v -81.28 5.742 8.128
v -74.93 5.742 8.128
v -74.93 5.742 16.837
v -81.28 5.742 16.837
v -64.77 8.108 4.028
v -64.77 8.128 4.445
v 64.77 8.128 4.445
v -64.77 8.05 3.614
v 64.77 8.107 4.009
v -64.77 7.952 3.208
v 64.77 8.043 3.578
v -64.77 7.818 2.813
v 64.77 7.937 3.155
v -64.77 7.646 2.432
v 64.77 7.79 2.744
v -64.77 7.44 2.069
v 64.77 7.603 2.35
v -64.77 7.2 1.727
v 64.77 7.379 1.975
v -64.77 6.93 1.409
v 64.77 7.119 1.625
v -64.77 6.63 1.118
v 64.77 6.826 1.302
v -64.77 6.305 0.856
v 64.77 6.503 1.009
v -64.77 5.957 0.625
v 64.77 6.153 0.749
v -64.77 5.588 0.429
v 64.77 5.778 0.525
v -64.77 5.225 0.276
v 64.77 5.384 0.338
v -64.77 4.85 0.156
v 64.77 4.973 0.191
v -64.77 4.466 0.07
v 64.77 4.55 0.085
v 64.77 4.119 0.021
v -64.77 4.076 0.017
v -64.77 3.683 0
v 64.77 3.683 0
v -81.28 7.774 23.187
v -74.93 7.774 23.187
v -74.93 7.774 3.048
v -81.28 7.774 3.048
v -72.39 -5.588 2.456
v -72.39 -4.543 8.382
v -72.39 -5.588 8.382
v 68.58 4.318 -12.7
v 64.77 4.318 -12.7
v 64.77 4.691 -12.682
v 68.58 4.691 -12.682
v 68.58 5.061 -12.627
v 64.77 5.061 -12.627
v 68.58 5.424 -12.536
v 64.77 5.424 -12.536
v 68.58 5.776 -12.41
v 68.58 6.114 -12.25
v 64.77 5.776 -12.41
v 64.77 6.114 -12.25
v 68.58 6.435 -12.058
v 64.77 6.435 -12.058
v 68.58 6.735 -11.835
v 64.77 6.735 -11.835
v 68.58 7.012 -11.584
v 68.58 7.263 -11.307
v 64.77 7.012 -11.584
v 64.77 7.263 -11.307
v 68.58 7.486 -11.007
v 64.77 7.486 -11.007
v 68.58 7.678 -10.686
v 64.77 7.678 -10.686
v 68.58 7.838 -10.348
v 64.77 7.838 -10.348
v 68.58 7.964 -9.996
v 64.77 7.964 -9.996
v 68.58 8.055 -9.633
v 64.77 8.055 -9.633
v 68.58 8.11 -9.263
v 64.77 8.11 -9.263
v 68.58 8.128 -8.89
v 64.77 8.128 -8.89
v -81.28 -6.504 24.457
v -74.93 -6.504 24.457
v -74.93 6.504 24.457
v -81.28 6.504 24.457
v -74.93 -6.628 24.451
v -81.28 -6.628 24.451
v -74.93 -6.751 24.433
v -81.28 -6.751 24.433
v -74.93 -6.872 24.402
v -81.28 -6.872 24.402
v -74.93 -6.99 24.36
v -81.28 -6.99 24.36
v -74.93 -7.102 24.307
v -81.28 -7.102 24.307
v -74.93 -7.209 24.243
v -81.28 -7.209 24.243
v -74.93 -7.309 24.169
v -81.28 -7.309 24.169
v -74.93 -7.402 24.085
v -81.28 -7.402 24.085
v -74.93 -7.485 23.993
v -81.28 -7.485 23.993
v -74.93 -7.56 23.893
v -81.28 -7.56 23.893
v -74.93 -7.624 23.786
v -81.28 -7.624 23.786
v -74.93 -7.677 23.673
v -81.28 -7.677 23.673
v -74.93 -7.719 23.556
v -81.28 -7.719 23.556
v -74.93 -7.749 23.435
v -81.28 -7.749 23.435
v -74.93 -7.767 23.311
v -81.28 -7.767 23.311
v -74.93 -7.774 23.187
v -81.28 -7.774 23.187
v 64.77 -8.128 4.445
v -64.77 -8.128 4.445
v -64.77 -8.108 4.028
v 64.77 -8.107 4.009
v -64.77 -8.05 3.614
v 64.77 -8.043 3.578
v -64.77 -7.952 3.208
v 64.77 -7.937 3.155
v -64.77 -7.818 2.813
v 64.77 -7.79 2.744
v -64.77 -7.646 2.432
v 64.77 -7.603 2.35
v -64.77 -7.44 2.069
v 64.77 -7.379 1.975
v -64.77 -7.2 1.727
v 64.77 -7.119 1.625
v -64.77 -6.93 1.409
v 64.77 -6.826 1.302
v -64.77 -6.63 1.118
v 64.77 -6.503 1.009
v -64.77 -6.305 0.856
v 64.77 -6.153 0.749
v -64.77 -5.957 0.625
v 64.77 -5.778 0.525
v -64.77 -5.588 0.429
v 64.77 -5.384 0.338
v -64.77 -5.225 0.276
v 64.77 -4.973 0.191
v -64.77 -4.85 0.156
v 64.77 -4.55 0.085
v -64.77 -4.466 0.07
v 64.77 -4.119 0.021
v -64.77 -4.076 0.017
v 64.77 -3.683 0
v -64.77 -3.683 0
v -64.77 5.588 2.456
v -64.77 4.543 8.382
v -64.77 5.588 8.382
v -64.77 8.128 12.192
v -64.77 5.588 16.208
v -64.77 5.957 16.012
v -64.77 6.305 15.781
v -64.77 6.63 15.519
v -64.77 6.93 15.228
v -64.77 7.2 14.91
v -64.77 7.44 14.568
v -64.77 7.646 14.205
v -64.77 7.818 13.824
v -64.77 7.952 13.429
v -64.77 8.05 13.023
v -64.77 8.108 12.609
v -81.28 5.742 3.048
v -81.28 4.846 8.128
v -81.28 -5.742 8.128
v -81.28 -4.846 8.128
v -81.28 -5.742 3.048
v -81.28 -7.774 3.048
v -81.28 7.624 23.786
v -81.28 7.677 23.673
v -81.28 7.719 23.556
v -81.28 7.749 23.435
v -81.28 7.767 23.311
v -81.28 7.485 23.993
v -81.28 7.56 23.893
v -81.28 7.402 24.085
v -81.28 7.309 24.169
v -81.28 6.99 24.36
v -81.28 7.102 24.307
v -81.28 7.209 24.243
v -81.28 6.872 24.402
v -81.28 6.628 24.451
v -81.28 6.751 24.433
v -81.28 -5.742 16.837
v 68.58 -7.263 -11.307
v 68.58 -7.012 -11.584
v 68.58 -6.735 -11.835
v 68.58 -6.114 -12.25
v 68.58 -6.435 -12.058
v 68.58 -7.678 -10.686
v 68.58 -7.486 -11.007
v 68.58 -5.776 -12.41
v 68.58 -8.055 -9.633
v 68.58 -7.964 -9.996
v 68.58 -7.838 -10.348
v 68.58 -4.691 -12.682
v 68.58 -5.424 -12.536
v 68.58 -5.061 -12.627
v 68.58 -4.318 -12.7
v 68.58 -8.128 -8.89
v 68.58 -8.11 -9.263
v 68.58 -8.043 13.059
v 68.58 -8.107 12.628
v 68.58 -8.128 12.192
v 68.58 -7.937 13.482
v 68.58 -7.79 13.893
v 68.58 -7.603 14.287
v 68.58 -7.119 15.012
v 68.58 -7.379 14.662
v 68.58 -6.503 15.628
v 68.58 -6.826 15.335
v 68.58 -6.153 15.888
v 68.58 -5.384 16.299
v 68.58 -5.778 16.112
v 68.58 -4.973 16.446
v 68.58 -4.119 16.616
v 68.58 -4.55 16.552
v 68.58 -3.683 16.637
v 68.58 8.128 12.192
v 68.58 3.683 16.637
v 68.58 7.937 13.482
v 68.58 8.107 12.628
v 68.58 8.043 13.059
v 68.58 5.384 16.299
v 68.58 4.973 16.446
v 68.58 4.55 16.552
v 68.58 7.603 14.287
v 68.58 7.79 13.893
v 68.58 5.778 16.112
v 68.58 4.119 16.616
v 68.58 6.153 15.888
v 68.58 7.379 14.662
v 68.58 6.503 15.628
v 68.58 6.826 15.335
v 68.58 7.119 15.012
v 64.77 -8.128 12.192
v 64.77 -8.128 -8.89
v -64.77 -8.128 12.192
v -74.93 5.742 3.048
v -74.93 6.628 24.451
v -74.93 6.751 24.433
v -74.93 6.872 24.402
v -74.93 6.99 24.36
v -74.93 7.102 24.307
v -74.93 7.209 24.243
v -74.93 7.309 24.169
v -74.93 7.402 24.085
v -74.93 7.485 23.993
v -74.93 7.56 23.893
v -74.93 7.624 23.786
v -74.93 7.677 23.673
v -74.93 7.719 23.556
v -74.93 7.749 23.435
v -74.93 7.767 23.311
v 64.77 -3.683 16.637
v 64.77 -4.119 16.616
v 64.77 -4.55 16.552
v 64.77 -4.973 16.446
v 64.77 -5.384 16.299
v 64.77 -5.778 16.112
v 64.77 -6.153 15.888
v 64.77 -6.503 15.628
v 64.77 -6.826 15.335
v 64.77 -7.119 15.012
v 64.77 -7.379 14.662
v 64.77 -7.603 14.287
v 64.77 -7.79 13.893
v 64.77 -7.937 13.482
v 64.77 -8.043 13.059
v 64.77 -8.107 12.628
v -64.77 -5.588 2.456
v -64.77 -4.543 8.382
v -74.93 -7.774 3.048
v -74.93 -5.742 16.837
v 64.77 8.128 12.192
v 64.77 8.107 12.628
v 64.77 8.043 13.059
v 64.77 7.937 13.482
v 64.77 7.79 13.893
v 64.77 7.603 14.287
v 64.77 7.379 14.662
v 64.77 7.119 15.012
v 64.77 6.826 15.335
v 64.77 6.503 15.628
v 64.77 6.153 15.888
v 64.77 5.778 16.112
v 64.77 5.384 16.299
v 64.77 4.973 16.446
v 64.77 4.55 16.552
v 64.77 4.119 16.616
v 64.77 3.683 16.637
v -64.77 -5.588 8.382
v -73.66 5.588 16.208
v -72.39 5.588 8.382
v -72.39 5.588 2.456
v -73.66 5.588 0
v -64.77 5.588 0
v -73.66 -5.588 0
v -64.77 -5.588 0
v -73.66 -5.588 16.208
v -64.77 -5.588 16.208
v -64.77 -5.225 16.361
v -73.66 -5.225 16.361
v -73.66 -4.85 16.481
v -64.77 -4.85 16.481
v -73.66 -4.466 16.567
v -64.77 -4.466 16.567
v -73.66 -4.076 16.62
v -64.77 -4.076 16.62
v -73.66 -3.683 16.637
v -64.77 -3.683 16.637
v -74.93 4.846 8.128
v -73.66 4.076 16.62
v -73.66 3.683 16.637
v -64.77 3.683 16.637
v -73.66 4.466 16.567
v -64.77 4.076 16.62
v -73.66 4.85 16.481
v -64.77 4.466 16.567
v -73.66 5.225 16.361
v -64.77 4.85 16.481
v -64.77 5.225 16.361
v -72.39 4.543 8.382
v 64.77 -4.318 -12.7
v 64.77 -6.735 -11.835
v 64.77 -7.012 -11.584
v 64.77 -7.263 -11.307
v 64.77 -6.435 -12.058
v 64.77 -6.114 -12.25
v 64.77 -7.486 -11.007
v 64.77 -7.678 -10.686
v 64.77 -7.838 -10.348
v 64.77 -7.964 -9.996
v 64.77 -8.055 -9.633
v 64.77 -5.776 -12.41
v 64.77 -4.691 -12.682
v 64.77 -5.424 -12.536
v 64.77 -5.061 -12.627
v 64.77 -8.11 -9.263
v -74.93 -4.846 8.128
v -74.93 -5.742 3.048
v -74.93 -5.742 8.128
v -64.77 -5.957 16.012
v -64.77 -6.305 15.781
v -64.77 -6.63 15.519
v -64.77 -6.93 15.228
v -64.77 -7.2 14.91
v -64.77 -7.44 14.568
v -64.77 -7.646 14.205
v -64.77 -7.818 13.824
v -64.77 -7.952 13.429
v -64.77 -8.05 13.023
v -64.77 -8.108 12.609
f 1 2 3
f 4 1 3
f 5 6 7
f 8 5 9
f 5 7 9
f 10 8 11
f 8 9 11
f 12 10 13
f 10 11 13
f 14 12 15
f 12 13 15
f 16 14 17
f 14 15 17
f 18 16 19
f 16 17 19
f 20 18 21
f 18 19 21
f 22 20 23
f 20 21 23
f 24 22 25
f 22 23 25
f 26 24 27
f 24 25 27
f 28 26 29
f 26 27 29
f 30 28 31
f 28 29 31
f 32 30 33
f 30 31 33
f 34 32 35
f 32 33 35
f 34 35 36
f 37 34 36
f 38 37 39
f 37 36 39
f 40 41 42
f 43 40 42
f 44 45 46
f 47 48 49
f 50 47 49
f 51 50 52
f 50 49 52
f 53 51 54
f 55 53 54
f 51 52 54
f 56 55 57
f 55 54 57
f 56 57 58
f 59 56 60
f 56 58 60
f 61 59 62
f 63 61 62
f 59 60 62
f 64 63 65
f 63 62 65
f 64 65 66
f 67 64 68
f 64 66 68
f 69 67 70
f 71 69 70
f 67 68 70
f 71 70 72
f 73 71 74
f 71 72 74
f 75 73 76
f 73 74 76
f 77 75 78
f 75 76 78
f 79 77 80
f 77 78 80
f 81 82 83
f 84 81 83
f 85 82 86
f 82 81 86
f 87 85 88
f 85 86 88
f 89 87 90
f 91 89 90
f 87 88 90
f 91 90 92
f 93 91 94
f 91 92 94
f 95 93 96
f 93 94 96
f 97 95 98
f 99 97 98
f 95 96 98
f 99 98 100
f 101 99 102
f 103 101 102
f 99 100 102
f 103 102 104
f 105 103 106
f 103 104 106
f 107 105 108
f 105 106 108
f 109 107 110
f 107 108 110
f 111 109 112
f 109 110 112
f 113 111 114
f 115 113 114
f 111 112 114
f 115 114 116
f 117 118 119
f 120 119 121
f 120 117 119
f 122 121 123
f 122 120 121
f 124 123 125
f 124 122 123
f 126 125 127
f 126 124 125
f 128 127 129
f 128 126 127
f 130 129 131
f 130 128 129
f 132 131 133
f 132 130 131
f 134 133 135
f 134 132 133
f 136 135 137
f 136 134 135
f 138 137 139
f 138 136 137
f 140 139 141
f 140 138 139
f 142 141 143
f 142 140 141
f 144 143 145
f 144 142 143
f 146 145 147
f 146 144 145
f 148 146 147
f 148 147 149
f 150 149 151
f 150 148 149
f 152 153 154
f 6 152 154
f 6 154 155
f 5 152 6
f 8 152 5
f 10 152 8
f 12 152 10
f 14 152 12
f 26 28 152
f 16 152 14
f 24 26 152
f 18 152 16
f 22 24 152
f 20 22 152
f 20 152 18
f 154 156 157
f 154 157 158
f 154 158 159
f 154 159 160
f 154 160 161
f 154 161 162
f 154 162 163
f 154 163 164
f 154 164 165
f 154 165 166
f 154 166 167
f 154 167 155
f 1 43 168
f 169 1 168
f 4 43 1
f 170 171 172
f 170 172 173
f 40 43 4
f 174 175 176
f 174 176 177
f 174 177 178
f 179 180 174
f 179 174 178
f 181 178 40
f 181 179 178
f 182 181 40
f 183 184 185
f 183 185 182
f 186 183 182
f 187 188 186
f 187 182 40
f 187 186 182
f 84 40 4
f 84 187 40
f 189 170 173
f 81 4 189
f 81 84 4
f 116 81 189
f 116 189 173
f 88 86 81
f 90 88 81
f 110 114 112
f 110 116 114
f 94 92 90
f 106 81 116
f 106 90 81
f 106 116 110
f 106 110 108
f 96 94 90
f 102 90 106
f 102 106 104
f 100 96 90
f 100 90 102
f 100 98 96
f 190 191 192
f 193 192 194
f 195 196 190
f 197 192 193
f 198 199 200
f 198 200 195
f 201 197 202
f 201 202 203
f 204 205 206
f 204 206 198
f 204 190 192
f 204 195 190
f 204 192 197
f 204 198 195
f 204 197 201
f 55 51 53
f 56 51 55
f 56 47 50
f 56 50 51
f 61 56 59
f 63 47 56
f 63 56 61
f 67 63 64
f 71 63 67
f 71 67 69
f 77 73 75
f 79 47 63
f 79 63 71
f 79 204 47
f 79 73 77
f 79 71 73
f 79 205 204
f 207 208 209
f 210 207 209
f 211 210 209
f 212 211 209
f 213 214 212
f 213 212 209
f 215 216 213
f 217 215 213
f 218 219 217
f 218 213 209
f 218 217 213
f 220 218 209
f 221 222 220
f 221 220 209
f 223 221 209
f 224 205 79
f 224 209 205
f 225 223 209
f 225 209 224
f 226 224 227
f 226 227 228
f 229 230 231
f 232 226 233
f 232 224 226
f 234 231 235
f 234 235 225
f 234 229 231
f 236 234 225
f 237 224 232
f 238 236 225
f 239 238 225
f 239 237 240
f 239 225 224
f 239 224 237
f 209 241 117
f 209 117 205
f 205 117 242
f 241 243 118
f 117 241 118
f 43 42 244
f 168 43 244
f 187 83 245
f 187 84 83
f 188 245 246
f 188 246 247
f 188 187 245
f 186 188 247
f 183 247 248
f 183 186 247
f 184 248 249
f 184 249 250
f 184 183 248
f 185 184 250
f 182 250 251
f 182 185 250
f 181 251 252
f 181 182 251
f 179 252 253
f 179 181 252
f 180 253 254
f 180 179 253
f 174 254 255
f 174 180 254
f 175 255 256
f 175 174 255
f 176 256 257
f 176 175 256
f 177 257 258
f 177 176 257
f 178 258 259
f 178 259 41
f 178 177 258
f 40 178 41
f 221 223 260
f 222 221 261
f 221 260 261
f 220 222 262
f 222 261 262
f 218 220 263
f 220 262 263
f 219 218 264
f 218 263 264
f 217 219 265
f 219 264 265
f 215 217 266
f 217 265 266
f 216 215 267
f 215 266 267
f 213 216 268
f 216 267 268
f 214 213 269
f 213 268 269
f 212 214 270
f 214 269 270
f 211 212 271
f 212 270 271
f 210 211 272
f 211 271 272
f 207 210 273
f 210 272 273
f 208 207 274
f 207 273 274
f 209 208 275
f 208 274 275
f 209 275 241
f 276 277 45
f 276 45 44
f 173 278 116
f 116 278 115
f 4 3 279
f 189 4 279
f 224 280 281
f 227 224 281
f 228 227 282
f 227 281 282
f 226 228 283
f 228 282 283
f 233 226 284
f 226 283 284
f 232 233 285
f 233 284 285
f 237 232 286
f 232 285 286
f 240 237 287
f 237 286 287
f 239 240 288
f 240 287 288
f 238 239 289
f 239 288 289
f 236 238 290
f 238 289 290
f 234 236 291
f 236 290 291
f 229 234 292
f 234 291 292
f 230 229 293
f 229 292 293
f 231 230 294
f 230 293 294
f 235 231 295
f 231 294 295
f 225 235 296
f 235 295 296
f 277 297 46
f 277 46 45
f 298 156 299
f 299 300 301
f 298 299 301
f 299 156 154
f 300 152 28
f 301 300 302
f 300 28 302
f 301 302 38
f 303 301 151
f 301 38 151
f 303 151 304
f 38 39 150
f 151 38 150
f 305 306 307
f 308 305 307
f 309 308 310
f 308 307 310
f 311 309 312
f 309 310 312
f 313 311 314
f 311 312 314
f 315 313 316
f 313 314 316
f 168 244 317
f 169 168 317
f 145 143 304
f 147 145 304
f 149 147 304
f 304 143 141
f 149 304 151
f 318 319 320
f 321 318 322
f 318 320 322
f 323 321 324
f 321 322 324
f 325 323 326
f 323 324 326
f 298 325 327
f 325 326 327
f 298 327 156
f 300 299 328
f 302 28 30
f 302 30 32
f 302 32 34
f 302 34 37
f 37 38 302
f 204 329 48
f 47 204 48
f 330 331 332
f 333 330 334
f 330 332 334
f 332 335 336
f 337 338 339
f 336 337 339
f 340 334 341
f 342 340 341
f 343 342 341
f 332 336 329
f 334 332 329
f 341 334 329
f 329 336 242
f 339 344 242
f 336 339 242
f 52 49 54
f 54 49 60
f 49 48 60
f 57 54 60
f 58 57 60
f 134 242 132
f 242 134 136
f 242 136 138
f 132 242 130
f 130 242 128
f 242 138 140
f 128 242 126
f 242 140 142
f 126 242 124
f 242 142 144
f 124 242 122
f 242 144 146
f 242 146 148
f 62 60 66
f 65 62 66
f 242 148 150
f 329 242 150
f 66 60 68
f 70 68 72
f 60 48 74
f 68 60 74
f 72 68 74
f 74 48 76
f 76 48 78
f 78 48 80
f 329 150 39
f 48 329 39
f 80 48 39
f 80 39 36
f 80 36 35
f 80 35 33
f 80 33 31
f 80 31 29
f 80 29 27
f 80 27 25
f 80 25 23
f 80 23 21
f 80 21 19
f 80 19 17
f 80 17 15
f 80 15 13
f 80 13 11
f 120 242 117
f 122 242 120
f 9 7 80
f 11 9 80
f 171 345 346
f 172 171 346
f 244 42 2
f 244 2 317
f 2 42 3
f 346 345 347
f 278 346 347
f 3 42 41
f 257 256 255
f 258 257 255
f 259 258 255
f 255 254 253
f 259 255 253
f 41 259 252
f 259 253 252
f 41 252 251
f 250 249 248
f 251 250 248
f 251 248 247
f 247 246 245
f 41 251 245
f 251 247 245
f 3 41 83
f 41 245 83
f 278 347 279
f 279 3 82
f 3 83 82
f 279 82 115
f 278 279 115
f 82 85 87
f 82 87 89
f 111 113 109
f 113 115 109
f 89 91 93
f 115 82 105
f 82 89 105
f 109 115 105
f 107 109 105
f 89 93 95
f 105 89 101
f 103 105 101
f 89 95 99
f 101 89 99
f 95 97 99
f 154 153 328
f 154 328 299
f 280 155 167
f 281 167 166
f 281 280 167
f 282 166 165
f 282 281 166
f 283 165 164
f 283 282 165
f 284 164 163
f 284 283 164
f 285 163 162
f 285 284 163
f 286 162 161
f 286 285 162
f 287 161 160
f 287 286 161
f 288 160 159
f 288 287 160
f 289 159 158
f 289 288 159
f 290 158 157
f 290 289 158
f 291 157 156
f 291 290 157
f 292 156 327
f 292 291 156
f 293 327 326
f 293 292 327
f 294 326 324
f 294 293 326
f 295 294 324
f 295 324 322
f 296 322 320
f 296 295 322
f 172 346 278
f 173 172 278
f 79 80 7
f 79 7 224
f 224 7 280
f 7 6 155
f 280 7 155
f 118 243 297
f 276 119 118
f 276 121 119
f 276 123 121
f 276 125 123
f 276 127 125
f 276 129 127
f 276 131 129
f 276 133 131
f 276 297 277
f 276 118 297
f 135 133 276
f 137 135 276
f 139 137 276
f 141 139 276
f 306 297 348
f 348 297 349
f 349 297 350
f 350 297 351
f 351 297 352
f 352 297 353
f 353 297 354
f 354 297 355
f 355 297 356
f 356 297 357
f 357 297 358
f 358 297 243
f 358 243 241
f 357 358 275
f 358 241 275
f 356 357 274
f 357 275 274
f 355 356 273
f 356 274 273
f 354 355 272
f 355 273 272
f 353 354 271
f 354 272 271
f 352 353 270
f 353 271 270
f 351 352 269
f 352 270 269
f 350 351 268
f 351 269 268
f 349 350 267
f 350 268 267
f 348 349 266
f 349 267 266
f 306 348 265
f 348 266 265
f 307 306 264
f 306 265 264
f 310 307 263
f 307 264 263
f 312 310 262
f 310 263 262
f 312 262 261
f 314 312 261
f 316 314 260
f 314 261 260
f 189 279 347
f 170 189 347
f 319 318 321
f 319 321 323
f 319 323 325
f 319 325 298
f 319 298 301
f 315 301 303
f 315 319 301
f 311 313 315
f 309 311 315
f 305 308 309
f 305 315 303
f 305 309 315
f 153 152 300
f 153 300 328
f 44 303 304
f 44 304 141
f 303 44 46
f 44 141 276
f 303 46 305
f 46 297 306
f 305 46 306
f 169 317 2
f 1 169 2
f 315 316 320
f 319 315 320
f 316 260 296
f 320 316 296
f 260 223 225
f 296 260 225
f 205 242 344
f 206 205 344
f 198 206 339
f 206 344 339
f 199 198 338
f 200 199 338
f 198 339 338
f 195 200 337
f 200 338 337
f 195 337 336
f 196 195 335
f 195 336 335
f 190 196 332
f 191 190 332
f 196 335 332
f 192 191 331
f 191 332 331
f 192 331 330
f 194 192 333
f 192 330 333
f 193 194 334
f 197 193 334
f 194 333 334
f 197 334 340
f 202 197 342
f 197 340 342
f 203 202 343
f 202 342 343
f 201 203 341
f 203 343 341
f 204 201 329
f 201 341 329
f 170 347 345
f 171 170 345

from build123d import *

# Parameters (mm, degrees)
F0_W      = 129.54
F0_H      = 16.256
F1_DEPTH  = 16.637
F2_R      = 4.445
F4_DEPTH  = 3.81
F6_DEPTH  = 8.89
F8_START  = 1.27
F8_DEPTH  = 6.35
F10_START = -1.27
F10_DEPTH = 7.62
F11_R     = 1.27


with BuildPart() as f1:
    # F0 (on Top) → F1 (new body)
    with BuildSketch(Plane.XY):
        Rectangle(F0_W, F0_H)
    extrude(amount=F1_DEPTH)

    # F2
    f2_edges = [f1.edges().sort_by_distance(p)[0] for p in [
        (0, -8.128, 16.637),
        (0, 8.128, 16.637),
        (0, -8.128, 0),
        (0, 8.128, 0),
    ]]
    fillet(f2_edges, radius=F2_R)

    # F3 (on face) → F4 (join)
    with BuildSketch(Plane.YZ.offset(64.77)):
        with BuildLine():
            Line((3.683, 16.637), (-3.683, 16.637))
            ThreePointArc((-3.683, 16.637), (-6.8260896424, 15.3350896424), (-8.128, 12.192))
            Line((-8.128, 12.192), (-8.128, -8.89))
            ThreePointArc((-8.128, -8.89), (-7.0120768363, -11.5840768363), (-4.318, -12.7))
            Line((-4.318, -12.7), (4.318, -12.7))
            ThreePointArc((4.318, -12.7), (7.0120768363, -11.5840768363), (8.128, -8.89))
            Line((8.128, -8.89), (8.128, 12.192))
            ThreePointArc((8.128, 12.192), (6.8260896424, 15.3350896424), (3.683, 16.637))
        make_face()
    extrude(amount=F4_DEPTH)

    # F5 (on face) → F6 (join)
    with BuildSketch(Plane(origin=(-64.77, 0, 0), x_dir=(0, -1, 0), z_dir=(-1, 0, 0))):
        with BuildLine():
            Line((3.683, 16.637), (-3.683, 16.637))
            ThreePointArc((-3.683, 16.637), (-4.6593435017, 16.5284476668), (-5.588, 16.2080926284))
            Line((-5.588, 16.2080926284), (-5.588, 0))
            Line((-5.588, 0), (5.588, 0))
            Line((5.588, 0), (5.588, 16.2080926284))
            ThreePointArc((5.588, 16.2080926284), (4.6593435017, 16.5284476668), (3.683, 16.637))
        make_face()
    extrude(amount=F6_DEPTH)

    # F9 (on face) → F10 (cut)
    with BuildSketch(Plane(origin=(-73.66, 0, 0), x_dir=(0, -1, 0), z_dir=(-1, 0, 0)).offset(F10_START)):
        Polygon((-5.588, 2.4564579041), (-4.543167048, 8.3820000291), (-5.588, 8.3820000291), align=None)
        Polygon((5.588, 8.3820000291), (4.543167048, 8.3820000291), (5.588, 2.4564579041), align=None)
    extrude(amount=-F10_DEPTH, mode=Mode.SUBTRACT)


with BuildPart() as f8:
    # F7 (on face) → F8 (new body)
    with BuildSketch(Plane(origin=(-73.66, 0, 0), x_dir=(0, -1, 0), z_dir=(-1, 0, 0)).offset(F8_START)):
        Polygon((7.7736135572, 24.457), (0, 24.457), (-7.7736135572, 24.457), (-7.7736135572, 3.048), (-5.7416135572, 3.048), (-4.8458724952, 8.128), (-5.7416135572, 8.128), (-5.7416135572, 16.837), (0, 16.837), (5.7416135572, 16.837), (5.7416135572, 8.128), (4.8458724952, 8.128), (5.7416135572, 3.048), (7.7736135572, 3.048), align=None)
    extrude(amount=F8_DEPTH)

    # F11
    f11_edges = [f8.edges().sort_by_distance(p)[0] for p in [
        (-78.105, 7.773614, 24.457),
        (-78.105, -7.773614, 24.457),
    ]]
    fillet(f11_edges, radius=F11_R)


solid = Compound([f1.part, f8.part])
